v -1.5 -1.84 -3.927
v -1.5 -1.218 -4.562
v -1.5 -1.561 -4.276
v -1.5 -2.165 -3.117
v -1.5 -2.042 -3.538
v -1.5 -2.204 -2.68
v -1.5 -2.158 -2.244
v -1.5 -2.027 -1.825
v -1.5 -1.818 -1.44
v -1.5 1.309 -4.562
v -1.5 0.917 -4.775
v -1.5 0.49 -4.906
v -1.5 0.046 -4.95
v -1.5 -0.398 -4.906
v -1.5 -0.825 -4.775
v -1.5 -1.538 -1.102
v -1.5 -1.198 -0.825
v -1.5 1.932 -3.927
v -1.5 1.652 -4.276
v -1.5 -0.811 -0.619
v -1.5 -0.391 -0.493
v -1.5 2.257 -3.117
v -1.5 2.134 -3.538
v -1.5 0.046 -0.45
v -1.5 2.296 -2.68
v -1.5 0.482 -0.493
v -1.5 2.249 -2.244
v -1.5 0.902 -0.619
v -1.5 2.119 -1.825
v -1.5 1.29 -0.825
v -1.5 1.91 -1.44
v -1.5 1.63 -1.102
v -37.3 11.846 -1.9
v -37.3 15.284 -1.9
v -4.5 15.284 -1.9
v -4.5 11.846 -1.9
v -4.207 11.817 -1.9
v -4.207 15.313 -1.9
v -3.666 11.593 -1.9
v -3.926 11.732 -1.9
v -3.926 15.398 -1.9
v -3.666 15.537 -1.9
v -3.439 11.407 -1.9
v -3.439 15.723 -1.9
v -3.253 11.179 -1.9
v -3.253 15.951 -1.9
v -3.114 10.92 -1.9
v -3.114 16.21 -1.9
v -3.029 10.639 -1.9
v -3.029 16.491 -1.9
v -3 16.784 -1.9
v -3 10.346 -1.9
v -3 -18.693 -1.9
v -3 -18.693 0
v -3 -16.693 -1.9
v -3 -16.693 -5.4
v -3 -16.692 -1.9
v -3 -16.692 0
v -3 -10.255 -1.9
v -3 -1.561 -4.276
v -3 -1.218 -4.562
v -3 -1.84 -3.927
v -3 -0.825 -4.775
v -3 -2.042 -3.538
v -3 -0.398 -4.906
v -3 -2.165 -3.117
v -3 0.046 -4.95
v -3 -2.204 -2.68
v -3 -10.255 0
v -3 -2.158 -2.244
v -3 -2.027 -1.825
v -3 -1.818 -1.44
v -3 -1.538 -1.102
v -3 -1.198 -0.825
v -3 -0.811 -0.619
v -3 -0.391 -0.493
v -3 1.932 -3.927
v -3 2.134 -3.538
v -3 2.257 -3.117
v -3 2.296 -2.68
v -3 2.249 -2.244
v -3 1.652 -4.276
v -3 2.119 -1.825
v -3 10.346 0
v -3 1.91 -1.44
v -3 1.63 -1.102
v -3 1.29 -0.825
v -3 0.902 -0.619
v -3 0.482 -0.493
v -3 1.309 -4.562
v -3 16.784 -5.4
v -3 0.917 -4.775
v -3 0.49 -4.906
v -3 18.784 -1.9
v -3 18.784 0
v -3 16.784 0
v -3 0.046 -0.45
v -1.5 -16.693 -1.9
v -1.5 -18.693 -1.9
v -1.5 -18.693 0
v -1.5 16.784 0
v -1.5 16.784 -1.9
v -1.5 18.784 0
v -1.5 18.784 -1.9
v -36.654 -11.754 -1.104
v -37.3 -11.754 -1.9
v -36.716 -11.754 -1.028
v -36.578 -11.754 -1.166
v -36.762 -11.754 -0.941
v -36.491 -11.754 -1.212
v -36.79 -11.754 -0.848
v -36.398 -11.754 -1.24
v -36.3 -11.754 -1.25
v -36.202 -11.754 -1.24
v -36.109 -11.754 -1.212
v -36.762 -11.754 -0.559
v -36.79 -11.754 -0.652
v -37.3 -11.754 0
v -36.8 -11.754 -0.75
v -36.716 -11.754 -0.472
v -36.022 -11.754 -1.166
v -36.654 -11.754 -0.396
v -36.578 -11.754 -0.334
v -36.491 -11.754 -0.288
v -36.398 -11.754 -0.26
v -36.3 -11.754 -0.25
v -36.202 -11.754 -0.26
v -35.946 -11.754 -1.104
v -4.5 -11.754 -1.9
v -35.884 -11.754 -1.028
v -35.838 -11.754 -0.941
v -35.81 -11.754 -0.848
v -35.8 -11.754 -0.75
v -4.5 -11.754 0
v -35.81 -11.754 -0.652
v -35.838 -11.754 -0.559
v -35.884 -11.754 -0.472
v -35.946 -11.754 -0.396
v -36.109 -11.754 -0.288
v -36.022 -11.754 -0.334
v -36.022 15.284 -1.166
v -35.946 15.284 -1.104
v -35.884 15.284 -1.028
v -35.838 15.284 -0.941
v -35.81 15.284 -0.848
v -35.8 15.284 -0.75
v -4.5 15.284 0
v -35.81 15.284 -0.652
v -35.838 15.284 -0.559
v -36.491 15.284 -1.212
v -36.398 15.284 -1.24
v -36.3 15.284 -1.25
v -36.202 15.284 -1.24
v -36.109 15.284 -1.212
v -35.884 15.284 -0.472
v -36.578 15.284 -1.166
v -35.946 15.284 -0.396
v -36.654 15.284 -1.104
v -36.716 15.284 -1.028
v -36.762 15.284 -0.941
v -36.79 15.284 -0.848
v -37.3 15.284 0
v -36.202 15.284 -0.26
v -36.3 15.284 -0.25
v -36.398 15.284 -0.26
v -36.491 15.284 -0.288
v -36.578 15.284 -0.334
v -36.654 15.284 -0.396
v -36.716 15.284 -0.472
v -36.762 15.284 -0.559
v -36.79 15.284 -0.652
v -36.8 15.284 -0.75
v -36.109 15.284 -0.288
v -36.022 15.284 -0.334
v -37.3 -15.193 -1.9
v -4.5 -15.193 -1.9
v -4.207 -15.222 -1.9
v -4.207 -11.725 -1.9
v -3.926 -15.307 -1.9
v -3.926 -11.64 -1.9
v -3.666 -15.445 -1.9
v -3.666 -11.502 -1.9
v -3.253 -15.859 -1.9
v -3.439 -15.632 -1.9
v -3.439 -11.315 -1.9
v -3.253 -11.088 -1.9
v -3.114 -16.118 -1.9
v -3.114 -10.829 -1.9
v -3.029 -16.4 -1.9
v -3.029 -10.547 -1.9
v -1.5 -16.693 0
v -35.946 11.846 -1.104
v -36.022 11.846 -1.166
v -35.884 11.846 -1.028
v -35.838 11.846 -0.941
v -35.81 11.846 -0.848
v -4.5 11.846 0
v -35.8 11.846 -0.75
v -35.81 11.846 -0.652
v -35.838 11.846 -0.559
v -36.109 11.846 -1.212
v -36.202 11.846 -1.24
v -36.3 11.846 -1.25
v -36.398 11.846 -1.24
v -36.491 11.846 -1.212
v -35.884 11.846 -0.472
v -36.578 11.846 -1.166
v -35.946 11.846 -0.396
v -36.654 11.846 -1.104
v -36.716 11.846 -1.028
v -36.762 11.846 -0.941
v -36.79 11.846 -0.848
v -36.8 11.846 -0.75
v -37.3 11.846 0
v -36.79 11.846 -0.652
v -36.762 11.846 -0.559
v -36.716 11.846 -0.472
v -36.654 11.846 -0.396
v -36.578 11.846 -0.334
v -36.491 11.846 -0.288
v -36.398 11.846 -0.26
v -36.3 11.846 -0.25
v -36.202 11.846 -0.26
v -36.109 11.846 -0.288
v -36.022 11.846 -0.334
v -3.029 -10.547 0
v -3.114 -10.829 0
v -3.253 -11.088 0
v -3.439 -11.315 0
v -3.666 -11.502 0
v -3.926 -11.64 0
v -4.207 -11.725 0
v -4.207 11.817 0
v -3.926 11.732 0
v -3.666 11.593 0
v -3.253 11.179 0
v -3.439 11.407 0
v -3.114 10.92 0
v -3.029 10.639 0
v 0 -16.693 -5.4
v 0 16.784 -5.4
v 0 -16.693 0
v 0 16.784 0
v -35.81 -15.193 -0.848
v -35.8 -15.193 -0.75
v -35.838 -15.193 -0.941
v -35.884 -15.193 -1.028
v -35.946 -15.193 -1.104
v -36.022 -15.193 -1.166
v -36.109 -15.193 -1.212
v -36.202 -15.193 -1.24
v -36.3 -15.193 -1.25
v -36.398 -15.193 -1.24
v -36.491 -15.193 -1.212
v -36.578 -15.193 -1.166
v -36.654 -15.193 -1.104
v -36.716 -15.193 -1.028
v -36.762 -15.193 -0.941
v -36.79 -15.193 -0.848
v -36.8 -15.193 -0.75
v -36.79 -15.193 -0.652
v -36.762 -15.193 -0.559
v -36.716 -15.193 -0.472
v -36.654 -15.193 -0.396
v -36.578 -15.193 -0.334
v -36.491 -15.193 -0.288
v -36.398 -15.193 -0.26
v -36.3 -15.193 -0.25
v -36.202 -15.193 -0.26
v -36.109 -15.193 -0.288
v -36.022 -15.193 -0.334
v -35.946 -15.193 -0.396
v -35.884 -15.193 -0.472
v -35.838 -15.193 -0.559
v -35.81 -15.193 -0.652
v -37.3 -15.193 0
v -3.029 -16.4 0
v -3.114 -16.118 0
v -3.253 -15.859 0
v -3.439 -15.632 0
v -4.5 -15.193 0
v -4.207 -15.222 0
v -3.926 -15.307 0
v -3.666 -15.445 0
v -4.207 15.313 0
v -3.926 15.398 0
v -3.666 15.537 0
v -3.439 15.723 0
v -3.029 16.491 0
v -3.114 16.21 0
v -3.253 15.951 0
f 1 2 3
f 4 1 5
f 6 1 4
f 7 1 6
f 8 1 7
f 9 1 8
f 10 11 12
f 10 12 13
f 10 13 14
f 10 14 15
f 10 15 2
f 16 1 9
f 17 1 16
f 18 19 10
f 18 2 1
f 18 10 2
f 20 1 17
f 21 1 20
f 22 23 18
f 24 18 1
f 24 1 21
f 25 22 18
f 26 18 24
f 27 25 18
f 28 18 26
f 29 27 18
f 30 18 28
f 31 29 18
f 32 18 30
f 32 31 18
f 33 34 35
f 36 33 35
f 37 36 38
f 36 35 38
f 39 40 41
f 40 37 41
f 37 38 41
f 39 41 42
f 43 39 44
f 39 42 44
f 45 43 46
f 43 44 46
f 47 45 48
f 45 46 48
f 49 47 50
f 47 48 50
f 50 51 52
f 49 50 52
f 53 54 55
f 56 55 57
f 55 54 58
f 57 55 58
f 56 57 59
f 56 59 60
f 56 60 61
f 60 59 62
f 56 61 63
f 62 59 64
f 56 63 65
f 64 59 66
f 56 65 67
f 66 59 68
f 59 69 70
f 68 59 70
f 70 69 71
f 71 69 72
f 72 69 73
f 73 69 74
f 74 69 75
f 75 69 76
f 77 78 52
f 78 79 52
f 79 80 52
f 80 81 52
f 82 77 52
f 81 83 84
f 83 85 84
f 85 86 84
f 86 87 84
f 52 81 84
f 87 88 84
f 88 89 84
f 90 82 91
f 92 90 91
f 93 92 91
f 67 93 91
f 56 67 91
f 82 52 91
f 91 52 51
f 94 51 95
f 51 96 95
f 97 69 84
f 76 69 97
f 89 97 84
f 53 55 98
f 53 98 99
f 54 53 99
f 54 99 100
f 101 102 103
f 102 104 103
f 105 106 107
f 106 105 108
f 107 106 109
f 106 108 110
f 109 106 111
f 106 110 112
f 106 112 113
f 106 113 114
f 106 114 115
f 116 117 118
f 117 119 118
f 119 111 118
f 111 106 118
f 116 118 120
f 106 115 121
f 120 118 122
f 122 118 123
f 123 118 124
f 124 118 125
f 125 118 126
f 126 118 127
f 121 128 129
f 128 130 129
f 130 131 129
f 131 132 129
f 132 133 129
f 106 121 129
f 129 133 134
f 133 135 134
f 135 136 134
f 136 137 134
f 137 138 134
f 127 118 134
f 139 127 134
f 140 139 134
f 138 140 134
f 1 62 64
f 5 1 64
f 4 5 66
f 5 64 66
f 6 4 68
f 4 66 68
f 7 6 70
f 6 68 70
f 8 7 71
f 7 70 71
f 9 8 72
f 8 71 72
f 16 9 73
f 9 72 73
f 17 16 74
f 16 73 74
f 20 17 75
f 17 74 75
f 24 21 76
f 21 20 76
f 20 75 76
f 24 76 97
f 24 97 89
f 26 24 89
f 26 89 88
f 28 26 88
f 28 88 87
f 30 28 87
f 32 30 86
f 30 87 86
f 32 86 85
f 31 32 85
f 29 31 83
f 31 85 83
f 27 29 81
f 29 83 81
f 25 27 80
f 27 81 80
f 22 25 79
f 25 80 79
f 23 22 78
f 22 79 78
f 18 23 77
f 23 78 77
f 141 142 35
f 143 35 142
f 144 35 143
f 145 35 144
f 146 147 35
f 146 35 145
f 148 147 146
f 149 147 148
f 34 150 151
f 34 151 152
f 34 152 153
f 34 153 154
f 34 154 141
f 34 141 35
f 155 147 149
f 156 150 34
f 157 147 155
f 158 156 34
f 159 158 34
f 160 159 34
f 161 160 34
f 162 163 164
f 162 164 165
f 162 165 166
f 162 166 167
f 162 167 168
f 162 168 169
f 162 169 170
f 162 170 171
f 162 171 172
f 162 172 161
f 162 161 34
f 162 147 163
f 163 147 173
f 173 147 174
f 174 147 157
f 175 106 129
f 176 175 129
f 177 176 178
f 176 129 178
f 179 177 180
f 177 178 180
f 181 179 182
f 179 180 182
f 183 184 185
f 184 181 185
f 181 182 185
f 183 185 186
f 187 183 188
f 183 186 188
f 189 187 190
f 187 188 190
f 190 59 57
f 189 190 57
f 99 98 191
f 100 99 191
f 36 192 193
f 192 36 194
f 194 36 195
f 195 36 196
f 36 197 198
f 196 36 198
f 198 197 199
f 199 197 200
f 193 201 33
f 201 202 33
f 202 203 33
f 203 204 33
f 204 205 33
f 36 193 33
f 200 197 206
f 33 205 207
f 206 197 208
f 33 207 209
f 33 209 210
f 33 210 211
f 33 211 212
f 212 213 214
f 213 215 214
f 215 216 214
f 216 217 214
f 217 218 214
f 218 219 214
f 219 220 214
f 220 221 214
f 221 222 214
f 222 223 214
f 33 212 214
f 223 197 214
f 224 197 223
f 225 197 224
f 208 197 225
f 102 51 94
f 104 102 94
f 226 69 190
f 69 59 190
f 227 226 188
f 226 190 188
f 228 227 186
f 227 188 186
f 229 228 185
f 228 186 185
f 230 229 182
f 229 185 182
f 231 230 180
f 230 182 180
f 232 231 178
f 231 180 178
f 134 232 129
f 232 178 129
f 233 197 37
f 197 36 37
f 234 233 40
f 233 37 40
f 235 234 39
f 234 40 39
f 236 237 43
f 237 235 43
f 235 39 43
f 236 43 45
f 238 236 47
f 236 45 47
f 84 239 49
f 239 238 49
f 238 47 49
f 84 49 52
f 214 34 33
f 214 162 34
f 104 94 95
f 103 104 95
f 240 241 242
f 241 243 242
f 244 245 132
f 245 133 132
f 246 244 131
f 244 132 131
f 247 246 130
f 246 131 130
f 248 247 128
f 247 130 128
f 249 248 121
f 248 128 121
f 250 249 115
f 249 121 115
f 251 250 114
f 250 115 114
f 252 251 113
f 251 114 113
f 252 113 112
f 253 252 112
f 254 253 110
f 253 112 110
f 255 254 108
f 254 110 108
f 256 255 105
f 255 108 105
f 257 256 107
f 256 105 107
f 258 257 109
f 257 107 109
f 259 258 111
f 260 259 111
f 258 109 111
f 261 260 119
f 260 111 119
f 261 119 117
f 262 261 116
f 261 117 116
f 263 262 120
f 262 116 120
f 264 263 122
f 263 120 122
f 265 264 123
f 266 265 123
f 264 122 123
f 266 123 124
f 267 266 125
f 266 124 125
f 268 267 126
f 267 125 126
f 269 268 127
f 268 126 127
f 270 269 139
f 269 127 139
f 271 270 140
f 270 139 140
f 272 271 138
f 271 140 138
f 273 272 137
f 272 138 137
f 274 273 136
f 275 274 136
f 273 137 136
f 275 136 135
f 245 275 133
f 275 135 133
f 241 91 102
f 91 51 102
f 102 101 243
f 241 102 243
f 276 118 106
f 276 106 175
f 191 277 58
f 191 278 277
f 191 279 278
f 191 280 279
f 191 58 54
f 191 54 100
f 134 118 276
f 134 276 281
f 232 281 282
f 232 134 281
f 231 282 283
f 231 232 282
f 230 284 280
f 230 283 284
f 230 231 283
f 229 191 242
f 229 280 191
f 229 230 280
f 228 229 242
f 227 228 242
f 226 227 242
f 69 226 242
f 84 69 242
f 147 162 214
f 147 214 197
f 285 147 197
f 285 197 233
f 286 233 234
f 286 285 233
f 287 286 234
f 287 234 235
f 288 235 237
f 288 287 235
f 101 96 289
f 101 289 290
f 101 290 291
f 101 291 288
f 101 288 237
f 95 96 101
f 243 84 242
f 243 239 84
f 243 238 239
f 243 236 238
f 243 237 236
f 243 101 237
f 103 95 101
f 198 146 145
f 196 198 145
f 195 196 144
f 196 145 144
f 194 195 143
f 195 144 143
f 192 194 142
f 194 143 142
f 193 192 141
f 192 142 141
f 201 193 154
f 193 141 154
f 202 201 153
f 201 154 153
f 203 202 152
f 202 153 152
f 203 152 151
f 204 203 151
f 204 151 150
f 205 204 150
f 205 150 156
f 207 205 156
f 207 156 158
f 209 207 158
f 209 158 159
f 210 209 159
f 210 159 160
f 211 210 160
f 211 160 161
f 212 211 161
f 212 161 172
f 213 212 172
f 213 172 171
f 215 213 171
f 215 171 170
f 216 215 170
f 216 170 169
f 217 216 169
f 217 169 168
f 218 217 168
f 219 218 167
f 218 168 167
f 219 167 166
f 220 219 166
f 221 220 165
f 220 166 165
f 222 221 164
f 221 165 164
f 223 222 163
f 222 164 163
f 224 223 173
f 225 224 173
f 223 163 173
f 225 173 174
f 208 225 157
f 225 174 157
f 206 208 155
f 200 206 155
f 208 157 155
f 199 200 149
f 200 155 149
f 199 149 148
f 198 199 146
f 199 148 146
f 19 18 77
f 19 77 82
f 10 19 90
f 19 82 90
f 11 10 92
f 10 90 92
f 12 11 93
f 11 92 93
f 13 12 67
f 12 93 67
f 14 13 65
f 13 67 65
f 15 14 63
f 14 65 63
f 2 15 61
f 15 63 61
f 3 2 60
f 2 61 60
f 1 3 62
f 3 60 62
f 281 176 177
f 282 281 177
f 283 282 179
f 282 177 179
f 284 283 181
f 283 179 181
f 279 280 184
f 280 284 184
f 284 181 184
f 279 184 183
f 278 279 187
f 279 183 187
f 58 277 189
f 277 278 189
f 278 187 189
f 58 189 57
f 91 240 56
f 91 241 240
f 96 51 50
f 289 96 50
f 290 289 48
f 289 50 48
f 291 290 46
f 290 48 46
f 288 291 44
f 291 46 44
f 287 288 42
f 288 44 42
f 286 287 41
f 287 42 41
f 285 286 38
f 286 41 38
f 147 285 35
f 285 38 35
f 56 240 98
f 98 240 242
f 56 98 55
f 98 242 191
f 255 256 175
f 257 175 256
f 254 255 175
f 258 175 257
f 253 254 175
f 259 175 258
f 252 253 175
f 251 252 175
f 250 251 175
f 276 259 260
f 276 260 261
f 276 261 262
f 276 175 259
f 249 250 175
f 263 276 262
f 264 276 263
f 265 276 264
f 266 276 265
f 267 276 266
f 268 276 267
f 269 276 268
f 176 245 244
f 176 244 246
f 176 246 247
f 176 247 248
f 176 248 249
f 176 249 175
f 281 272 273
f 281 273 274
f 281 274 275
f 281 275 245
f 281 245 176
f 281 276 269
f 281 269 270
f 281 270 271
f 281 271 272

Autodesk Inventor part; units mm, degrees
ref_plane "YZ Plane" through (0, 0, 0) normal (1, 0, 0) x (0, 1, 0)
ref_plane "XZ Plane" through (0, 0, 0) normal (0, 1, 0) x (-1, 0, 0)
ref_plane "XY Plane" through (0, 0, 0) normal (0, 0, 1) x (1, 0, 0)
sketch "Эскиз8" plane through (0, 0, 0) normal (0, 0, 1) x (1, 0, 0)
  line L0 (-9, -9.9543) -> (-9, 10.0457) projected
  line L1 (0, 17.0842) -> (0, -16.9927)
  line L2 (0, 16.7842) -> (-3, 16.7842)
  line L3 (-3, 16.7842) -> (-3, -16.6927)
  line L4 (-3, -16.6927) -> (0, -16.6927)
  line L5 (0, -16.6927) -> (0, 16.7842)
  line L6 (-44, 11.5457) -> (-9, 11.5457) projected
  line L7 (-9, 15.5842) -> (-44, 15.5842) projected
  line L8 (-44, 15.5842) -> (-44, 11.5457) projected
  line L9 (-44, -15.4927) -> (-9, -15.4927) projected
  line L10 (-9, -11.4543) -> (-44, -11.4543) projected
  line L11 (-44, -11.4543) -> (-44, -15.4927) projected
  line L12 (-9, 15.2842) -> (-44, 15.2842)
  line L13 (-44, -15.1927) -> (-9, -15.1927)
  line L14 (-44, 11.8457) -> (-9.3, 11.8457)
  line L15 (-44, -11.7543) -> (-9.3, -11.7543)
  line L16 (-9.3, 15.2842) -> (-3, 15.2842)
  line L17 (-3, 15.2842) -> (-3, 11.8457)
  line L18 (-3, 11.8457) -> (-9.3, 11.8457)
  line L19 (-9.3, -11.7543) -> (-3, -11.7543)
  line L20 (-3, -11.7543) -> (-3, -15.1927)
  line L21 (-3, -15.1927) -> (-9.3, -15.1927)
  line L22 (-37.3, 15.2842) -> (-37.3, -15.1927)
  arc A0 (-10.5, -11.4543) -> (-9, -9.9543) centre (-10.5, -9.9543) ccw projected
  arc A1 (-9, 10.0457) -> (-10.5, 11.5457) centre (-10.5, 10.0457) ccw projected
  line L23 (-10.5, 11.5457) -> (-32.1754, 11.5457) projected
  line L24 (-32.1754, 11.5457) -> (-31.4296, 7.5457) projected
  line L25 (-31.4296, 7.5457) -> (-26.1754, 7.5457) projected
  line L26 (-26.1754, -4.9543) -> (-26.1754, -7.4543) projected
  line L27 (-25.1754, 4.0457) -> (-24.6192, 4.0457) projected
  line L28 (-24.6192, 4.0457) -> (-24.6192, 9.5457) projected
  spline S0 degree 3 poles (-24.1006, 10.0457) (-24.1642, 10.0457) (-24.2391, 10.0312) (-24.3567, 9.984) (-24.4205, 9.943) (-24.5115, 9.8556) (-24.5549, 9.7937) (-24.6042, 9.6794) (-24.6192, 9.6072) (-24.6192, 9.5457) knots 0.074888 0.074888 0.074888 0.074888 0.093967 0.093967 0.112918 0.112918 0.131824 0.131824 0.15026 0.15026 0.15026 0.15026 projected
  line L29 (-24.1006, 10.0457) -> (-24.0379, 10.0457) projected
  spline S1 degree 3 poles (-23.5192, 9.5457) (-23.5192, 9.6072) (-23.5343, 9.6794) (-23.5836, 9.7937) (-23.6269, 9.8556) (-23.718, 9.943) (-23.7817, 9.984) (-23.8994, 10.0312) (-23.9743, 10.0457) (-24.0379, 10.0457) knots 0.15026 0.15026 0.15026 0.15026 0.168696 0.168696 0.187602 0.187602 0.206553 0.206553 0.225632 0.225632 0.225632 0.225632 projected
  line L30 (-23.5192, 9.5457) -> (-23.5192, 4.0457) projected
  line L31 (-22.8192, 4.0457) -> (-22.8192, -3.9543) projected
  line L32 (-22.8192, -3.9543) -> (-23.5192, -3.9543) projected
  line L33 (-23.5192, -3.9543) -> (-23.5192, -9.4543) projected
  spline S2 degree 3 poles (-24.0379, -9.9543) (-23.9743, -9.9543) (-23.8994, -9.9398) (-23.7817, -9.8925) (-23.718, -9.8516) (-23.6269, -9.7642) (-23.5836, -9.7022) (-23.5343, -9.5879) (-23.5192, -9.5157) (-23.5192, -9.4543) knots 0.074888 0.074888 0.074888 0.074888 0.093967 0.093967 0.112918 0.112918 0.131824 0.131824 0.15026 0.15026 0.15026 0.15026 projected
  line L34 (-24.0379, -9.9543) -> (-24.1006, -9.9543) projected
  spline S3 degree 3 poles (-24.6192, -9.4543) (-24.6192, -9.5157) (-24.6042, -9.5879) (-24.5549, -9.7022) (-24.5115, -9.7642) (-24.4205, -9.8516) (-24.3567, -9.8925) (-24.2391, -9.9398) (-24.1642, -9.9543) (-24.1006, -9.9543) knots 0.15026 0.15026 0.15026 0.15026 0.168696 0.168696 0.187602 0.187602 0.206553 0.206553 0.225632 0.225632 0.225632 0.225632 projected
  line L35 (-24.6192, -9.4543) -> (-24.6192, -3.9543) projected
  line L36 (-24.6192, -3.9543) -> (-25.1754, -3.9543) projected
  line L37 (-26.1754, 7.5457) -> (-26.1754, 5.0457) projected
  line L38 (-26.1754, -7.4543) -> (-31.4296, -7.4543) projected
  line L39 (-31.4296, -7.4543) -> (-32.1754, -11.4543) projected
  line L40 (-32.1754, -11.4543) -> (-10.5, -11.4543) projected
  line L41 (-26.1754, -4.9543) -> (-25.1754, -3.9543) projected
  line L42 (-25.1754, 4.0457) -> (-26.1754, 5.0457) projected
  line L43 (-23.5192, 4.0457) -> (-22.8192, 4.0457) projected
  point P0 (0, 0)
  point P1 (-32.1754, 15.5842)
  point P2 (-32.1754, -15.4927)
  point P3 (0, -16.6927)
  point P4 (-3, 15.2842)
  point P5 (-37.3, 11.8457)
  point P6 (-9.3, 11.8457)
  point P7 (-37.3, -11.7543)
  point P8 (-9, -15.1927)
  dimension "d40" = 3
  dimension "d43" = 0.3
  dimension "d44" = 0.3
  dimension "d45" = 0.3
  dimension "d46" = 0.3
  dimension "d47" = 6.7
extrude "Выдавливание8" add sketch "Эскиз8" against normal blind 1.9 contours L15 L19 L3 L21 L13 L22 | L22 L12 L16 L3 L18 L14 | L3 L2 L1 L4
sketch "Эскиз9" plane through (0, 0, -1.9) normal (0, 0, -1) x (-1, 0, 0)
  line L0 (0, 16.7842) -> (0, -16.6927) projected
  line L1 (0, -16.6927) -> (3, -16.6927) projected
  line L2 (3, -16.6927) -> (3, -15.1927) projected
  line L3 (3, -15.1927) -> (37.3, -15.1927) projected
  line L4 (37.3, -15.1927) -> (37.3, -11.7543) projected
  line L5 (37.3, -11.7543) -> (3, -11.7543) projected
  line L6 (3, -11.7543) -> (3, 11.8457) projected
  line L7 (3, 11.8457) -> (37.3, 11.8457) projected
  line L8 (37.3, 11.8457) -> (37.3, 15.2842) projected
  line L9 (37.3, 15.2842) -> (3, 15.2842) projected
  line L10 (3, 15.2842) -> (3, 16.7842) projected
  line L11 (3, 16.7842) -> (0, 16.7842) projected
  line L12 (37.3, 15.2842) -> (3, 15.2842) projected
  line L13 (3, -15.1927) -> (37.3, -15.1927) projected
  line L14 (3, 15.2842) -> (3, -15.1927)
  point P0 (0, 0)
  point P1 (3, -11.7543)
extrude "Выдавливание9" add sketch "Эскиз9" along normal blind 3.5 contours L11 L10 L14 L6 L2 L1 L0
fillet "Сопряжение9" radius 1.5 4 edges at (-3, 15.2842, -0.95) (-3, 11.8457, -0.95) (-3, -11.7543, -0.95) (-3, -15.1927, -0.95)
sketch "Эскиз10" plane through (-3, -16.6927, -5.4) normal (-1, 0, 0) x (0, 0, 1)
  arc A0 (1.4727, 14.8527) -> (1.4727, 18.6243) centre (2.7, 16.7385) ccw projected
  circle A1 centre (2.7, 16.7385) radius 2.25
  point P0 (5.4, 16.6927)
  point P1 (1.4727, 18.6243)
extrude "Выдавливание10" cut sketch "Эскиз10" against normal blind 1.5
sketch "Эскиз11" plane through (-3, -16.6927, -5.4) normal (-1, 0, 0) x (0, 0, 1)
  point P0 (5.4, 16.6927)
sketch "Эскиз12" plane through (-3, -16.6927, -5.4) normal (-1, 0, 0) x (0, 0, 1)
  circle A0 centre (2.7, 16.7385) radius 2.25 projected
  line L0 (3.5, 6.4385) -> (3.5, 0) projected
  line L1 (5.4, 6.4385) -> (3.5, 6.4385) projected
  line L2 (5.4, 27.0385) -> (5.4, 6.4385) projected
  line L3 (3.5, 27.0385) -> (5.4, 27.0385) projected
  line L4 (3.5, 33.4769) -> (3.5, 27.0385) projected
  line L5 (3.5, 33.4769) -> (0, 33.4769) projected
  line L6 (0, 0) -> (0, 33.4769) projected
  line L7 (3.5, 0) -> (0, 0) projected
  line L8 (3.5, 1.5) -> (3.5, 0) projected
  line L9 (5.4, 0) -> (3.5, 0) projected
  line L10 (5.4, 0) -> (5.4, 1.5) projected
  line L11 (5.4, 1.5) -> (3.5, 1.5) projected
  line L12 (5.4, 33.4769) -> (0, 33.4769) projected
  line L13 (5.4, 0) -> (3.5, 0)
  line L14 (3.5, 0) -> (3.5, -2)
  line L15 (3.5, -2) -> (5.4, -2)
  line L16 (5.4, -2) -> (5.4, 0)
  line L17 (3.5, 6.4385) -> (3.5, 0) projected
  line L18 (5.4, 33.4769) -> (3.5, 33.4769) projected
  line L19 (5.4, 33.4769) -> (3.5, 33.4769)
  line L20 (3.5, 33.4769) -> (3.5, 35.4769)
  line L21 (3.5, 35.4769) -> (5.4, 35.4769)
  line L22 (5.4, 35.4769) -> (5.4, 33.4769)
  line L23 (3.5, 33.4769) -> (3.5, 27.0385) projected
  point P0 (5.4, 16.6927)
  dimension "d56" = 2
  dimension "d57" = 2
extrude "Выдавливание11" add sketch "Эскиз12" against normal blind 1.5 contours L20 L21 L22 L12 | L9 L16 L15 L14
sketch "Эскиз13" plane through (-37.3, 15.2842, 0) normal (0, 1, 0) x (1, 0, 0)
  line L0 (32.8, 1.9) -> (32.8, 0) projected
  line L1 (0, 1.9) -> (32.8, 1.9) projected
  line L2 (0, 0) -> (0, 1.9) projected
  line L3 (32.8, 0) -> (0, 0) projected
  circle A0 centre (1, 0.75) radius 0.5
  circle A1 centre (1, 0.75) radius 0.75
  line L4 (1, 0.75) -> (0, 0.75)
  point P0 (37.3, 0)
  dimension "d60" = 1
  dimension "d61" = 1.5
  dimension "d62" = 1
extrude "Выдавливание12" cut sketch "Эскиз13" against normal blind 40 contours A0
properties part number "motherboard_key"
